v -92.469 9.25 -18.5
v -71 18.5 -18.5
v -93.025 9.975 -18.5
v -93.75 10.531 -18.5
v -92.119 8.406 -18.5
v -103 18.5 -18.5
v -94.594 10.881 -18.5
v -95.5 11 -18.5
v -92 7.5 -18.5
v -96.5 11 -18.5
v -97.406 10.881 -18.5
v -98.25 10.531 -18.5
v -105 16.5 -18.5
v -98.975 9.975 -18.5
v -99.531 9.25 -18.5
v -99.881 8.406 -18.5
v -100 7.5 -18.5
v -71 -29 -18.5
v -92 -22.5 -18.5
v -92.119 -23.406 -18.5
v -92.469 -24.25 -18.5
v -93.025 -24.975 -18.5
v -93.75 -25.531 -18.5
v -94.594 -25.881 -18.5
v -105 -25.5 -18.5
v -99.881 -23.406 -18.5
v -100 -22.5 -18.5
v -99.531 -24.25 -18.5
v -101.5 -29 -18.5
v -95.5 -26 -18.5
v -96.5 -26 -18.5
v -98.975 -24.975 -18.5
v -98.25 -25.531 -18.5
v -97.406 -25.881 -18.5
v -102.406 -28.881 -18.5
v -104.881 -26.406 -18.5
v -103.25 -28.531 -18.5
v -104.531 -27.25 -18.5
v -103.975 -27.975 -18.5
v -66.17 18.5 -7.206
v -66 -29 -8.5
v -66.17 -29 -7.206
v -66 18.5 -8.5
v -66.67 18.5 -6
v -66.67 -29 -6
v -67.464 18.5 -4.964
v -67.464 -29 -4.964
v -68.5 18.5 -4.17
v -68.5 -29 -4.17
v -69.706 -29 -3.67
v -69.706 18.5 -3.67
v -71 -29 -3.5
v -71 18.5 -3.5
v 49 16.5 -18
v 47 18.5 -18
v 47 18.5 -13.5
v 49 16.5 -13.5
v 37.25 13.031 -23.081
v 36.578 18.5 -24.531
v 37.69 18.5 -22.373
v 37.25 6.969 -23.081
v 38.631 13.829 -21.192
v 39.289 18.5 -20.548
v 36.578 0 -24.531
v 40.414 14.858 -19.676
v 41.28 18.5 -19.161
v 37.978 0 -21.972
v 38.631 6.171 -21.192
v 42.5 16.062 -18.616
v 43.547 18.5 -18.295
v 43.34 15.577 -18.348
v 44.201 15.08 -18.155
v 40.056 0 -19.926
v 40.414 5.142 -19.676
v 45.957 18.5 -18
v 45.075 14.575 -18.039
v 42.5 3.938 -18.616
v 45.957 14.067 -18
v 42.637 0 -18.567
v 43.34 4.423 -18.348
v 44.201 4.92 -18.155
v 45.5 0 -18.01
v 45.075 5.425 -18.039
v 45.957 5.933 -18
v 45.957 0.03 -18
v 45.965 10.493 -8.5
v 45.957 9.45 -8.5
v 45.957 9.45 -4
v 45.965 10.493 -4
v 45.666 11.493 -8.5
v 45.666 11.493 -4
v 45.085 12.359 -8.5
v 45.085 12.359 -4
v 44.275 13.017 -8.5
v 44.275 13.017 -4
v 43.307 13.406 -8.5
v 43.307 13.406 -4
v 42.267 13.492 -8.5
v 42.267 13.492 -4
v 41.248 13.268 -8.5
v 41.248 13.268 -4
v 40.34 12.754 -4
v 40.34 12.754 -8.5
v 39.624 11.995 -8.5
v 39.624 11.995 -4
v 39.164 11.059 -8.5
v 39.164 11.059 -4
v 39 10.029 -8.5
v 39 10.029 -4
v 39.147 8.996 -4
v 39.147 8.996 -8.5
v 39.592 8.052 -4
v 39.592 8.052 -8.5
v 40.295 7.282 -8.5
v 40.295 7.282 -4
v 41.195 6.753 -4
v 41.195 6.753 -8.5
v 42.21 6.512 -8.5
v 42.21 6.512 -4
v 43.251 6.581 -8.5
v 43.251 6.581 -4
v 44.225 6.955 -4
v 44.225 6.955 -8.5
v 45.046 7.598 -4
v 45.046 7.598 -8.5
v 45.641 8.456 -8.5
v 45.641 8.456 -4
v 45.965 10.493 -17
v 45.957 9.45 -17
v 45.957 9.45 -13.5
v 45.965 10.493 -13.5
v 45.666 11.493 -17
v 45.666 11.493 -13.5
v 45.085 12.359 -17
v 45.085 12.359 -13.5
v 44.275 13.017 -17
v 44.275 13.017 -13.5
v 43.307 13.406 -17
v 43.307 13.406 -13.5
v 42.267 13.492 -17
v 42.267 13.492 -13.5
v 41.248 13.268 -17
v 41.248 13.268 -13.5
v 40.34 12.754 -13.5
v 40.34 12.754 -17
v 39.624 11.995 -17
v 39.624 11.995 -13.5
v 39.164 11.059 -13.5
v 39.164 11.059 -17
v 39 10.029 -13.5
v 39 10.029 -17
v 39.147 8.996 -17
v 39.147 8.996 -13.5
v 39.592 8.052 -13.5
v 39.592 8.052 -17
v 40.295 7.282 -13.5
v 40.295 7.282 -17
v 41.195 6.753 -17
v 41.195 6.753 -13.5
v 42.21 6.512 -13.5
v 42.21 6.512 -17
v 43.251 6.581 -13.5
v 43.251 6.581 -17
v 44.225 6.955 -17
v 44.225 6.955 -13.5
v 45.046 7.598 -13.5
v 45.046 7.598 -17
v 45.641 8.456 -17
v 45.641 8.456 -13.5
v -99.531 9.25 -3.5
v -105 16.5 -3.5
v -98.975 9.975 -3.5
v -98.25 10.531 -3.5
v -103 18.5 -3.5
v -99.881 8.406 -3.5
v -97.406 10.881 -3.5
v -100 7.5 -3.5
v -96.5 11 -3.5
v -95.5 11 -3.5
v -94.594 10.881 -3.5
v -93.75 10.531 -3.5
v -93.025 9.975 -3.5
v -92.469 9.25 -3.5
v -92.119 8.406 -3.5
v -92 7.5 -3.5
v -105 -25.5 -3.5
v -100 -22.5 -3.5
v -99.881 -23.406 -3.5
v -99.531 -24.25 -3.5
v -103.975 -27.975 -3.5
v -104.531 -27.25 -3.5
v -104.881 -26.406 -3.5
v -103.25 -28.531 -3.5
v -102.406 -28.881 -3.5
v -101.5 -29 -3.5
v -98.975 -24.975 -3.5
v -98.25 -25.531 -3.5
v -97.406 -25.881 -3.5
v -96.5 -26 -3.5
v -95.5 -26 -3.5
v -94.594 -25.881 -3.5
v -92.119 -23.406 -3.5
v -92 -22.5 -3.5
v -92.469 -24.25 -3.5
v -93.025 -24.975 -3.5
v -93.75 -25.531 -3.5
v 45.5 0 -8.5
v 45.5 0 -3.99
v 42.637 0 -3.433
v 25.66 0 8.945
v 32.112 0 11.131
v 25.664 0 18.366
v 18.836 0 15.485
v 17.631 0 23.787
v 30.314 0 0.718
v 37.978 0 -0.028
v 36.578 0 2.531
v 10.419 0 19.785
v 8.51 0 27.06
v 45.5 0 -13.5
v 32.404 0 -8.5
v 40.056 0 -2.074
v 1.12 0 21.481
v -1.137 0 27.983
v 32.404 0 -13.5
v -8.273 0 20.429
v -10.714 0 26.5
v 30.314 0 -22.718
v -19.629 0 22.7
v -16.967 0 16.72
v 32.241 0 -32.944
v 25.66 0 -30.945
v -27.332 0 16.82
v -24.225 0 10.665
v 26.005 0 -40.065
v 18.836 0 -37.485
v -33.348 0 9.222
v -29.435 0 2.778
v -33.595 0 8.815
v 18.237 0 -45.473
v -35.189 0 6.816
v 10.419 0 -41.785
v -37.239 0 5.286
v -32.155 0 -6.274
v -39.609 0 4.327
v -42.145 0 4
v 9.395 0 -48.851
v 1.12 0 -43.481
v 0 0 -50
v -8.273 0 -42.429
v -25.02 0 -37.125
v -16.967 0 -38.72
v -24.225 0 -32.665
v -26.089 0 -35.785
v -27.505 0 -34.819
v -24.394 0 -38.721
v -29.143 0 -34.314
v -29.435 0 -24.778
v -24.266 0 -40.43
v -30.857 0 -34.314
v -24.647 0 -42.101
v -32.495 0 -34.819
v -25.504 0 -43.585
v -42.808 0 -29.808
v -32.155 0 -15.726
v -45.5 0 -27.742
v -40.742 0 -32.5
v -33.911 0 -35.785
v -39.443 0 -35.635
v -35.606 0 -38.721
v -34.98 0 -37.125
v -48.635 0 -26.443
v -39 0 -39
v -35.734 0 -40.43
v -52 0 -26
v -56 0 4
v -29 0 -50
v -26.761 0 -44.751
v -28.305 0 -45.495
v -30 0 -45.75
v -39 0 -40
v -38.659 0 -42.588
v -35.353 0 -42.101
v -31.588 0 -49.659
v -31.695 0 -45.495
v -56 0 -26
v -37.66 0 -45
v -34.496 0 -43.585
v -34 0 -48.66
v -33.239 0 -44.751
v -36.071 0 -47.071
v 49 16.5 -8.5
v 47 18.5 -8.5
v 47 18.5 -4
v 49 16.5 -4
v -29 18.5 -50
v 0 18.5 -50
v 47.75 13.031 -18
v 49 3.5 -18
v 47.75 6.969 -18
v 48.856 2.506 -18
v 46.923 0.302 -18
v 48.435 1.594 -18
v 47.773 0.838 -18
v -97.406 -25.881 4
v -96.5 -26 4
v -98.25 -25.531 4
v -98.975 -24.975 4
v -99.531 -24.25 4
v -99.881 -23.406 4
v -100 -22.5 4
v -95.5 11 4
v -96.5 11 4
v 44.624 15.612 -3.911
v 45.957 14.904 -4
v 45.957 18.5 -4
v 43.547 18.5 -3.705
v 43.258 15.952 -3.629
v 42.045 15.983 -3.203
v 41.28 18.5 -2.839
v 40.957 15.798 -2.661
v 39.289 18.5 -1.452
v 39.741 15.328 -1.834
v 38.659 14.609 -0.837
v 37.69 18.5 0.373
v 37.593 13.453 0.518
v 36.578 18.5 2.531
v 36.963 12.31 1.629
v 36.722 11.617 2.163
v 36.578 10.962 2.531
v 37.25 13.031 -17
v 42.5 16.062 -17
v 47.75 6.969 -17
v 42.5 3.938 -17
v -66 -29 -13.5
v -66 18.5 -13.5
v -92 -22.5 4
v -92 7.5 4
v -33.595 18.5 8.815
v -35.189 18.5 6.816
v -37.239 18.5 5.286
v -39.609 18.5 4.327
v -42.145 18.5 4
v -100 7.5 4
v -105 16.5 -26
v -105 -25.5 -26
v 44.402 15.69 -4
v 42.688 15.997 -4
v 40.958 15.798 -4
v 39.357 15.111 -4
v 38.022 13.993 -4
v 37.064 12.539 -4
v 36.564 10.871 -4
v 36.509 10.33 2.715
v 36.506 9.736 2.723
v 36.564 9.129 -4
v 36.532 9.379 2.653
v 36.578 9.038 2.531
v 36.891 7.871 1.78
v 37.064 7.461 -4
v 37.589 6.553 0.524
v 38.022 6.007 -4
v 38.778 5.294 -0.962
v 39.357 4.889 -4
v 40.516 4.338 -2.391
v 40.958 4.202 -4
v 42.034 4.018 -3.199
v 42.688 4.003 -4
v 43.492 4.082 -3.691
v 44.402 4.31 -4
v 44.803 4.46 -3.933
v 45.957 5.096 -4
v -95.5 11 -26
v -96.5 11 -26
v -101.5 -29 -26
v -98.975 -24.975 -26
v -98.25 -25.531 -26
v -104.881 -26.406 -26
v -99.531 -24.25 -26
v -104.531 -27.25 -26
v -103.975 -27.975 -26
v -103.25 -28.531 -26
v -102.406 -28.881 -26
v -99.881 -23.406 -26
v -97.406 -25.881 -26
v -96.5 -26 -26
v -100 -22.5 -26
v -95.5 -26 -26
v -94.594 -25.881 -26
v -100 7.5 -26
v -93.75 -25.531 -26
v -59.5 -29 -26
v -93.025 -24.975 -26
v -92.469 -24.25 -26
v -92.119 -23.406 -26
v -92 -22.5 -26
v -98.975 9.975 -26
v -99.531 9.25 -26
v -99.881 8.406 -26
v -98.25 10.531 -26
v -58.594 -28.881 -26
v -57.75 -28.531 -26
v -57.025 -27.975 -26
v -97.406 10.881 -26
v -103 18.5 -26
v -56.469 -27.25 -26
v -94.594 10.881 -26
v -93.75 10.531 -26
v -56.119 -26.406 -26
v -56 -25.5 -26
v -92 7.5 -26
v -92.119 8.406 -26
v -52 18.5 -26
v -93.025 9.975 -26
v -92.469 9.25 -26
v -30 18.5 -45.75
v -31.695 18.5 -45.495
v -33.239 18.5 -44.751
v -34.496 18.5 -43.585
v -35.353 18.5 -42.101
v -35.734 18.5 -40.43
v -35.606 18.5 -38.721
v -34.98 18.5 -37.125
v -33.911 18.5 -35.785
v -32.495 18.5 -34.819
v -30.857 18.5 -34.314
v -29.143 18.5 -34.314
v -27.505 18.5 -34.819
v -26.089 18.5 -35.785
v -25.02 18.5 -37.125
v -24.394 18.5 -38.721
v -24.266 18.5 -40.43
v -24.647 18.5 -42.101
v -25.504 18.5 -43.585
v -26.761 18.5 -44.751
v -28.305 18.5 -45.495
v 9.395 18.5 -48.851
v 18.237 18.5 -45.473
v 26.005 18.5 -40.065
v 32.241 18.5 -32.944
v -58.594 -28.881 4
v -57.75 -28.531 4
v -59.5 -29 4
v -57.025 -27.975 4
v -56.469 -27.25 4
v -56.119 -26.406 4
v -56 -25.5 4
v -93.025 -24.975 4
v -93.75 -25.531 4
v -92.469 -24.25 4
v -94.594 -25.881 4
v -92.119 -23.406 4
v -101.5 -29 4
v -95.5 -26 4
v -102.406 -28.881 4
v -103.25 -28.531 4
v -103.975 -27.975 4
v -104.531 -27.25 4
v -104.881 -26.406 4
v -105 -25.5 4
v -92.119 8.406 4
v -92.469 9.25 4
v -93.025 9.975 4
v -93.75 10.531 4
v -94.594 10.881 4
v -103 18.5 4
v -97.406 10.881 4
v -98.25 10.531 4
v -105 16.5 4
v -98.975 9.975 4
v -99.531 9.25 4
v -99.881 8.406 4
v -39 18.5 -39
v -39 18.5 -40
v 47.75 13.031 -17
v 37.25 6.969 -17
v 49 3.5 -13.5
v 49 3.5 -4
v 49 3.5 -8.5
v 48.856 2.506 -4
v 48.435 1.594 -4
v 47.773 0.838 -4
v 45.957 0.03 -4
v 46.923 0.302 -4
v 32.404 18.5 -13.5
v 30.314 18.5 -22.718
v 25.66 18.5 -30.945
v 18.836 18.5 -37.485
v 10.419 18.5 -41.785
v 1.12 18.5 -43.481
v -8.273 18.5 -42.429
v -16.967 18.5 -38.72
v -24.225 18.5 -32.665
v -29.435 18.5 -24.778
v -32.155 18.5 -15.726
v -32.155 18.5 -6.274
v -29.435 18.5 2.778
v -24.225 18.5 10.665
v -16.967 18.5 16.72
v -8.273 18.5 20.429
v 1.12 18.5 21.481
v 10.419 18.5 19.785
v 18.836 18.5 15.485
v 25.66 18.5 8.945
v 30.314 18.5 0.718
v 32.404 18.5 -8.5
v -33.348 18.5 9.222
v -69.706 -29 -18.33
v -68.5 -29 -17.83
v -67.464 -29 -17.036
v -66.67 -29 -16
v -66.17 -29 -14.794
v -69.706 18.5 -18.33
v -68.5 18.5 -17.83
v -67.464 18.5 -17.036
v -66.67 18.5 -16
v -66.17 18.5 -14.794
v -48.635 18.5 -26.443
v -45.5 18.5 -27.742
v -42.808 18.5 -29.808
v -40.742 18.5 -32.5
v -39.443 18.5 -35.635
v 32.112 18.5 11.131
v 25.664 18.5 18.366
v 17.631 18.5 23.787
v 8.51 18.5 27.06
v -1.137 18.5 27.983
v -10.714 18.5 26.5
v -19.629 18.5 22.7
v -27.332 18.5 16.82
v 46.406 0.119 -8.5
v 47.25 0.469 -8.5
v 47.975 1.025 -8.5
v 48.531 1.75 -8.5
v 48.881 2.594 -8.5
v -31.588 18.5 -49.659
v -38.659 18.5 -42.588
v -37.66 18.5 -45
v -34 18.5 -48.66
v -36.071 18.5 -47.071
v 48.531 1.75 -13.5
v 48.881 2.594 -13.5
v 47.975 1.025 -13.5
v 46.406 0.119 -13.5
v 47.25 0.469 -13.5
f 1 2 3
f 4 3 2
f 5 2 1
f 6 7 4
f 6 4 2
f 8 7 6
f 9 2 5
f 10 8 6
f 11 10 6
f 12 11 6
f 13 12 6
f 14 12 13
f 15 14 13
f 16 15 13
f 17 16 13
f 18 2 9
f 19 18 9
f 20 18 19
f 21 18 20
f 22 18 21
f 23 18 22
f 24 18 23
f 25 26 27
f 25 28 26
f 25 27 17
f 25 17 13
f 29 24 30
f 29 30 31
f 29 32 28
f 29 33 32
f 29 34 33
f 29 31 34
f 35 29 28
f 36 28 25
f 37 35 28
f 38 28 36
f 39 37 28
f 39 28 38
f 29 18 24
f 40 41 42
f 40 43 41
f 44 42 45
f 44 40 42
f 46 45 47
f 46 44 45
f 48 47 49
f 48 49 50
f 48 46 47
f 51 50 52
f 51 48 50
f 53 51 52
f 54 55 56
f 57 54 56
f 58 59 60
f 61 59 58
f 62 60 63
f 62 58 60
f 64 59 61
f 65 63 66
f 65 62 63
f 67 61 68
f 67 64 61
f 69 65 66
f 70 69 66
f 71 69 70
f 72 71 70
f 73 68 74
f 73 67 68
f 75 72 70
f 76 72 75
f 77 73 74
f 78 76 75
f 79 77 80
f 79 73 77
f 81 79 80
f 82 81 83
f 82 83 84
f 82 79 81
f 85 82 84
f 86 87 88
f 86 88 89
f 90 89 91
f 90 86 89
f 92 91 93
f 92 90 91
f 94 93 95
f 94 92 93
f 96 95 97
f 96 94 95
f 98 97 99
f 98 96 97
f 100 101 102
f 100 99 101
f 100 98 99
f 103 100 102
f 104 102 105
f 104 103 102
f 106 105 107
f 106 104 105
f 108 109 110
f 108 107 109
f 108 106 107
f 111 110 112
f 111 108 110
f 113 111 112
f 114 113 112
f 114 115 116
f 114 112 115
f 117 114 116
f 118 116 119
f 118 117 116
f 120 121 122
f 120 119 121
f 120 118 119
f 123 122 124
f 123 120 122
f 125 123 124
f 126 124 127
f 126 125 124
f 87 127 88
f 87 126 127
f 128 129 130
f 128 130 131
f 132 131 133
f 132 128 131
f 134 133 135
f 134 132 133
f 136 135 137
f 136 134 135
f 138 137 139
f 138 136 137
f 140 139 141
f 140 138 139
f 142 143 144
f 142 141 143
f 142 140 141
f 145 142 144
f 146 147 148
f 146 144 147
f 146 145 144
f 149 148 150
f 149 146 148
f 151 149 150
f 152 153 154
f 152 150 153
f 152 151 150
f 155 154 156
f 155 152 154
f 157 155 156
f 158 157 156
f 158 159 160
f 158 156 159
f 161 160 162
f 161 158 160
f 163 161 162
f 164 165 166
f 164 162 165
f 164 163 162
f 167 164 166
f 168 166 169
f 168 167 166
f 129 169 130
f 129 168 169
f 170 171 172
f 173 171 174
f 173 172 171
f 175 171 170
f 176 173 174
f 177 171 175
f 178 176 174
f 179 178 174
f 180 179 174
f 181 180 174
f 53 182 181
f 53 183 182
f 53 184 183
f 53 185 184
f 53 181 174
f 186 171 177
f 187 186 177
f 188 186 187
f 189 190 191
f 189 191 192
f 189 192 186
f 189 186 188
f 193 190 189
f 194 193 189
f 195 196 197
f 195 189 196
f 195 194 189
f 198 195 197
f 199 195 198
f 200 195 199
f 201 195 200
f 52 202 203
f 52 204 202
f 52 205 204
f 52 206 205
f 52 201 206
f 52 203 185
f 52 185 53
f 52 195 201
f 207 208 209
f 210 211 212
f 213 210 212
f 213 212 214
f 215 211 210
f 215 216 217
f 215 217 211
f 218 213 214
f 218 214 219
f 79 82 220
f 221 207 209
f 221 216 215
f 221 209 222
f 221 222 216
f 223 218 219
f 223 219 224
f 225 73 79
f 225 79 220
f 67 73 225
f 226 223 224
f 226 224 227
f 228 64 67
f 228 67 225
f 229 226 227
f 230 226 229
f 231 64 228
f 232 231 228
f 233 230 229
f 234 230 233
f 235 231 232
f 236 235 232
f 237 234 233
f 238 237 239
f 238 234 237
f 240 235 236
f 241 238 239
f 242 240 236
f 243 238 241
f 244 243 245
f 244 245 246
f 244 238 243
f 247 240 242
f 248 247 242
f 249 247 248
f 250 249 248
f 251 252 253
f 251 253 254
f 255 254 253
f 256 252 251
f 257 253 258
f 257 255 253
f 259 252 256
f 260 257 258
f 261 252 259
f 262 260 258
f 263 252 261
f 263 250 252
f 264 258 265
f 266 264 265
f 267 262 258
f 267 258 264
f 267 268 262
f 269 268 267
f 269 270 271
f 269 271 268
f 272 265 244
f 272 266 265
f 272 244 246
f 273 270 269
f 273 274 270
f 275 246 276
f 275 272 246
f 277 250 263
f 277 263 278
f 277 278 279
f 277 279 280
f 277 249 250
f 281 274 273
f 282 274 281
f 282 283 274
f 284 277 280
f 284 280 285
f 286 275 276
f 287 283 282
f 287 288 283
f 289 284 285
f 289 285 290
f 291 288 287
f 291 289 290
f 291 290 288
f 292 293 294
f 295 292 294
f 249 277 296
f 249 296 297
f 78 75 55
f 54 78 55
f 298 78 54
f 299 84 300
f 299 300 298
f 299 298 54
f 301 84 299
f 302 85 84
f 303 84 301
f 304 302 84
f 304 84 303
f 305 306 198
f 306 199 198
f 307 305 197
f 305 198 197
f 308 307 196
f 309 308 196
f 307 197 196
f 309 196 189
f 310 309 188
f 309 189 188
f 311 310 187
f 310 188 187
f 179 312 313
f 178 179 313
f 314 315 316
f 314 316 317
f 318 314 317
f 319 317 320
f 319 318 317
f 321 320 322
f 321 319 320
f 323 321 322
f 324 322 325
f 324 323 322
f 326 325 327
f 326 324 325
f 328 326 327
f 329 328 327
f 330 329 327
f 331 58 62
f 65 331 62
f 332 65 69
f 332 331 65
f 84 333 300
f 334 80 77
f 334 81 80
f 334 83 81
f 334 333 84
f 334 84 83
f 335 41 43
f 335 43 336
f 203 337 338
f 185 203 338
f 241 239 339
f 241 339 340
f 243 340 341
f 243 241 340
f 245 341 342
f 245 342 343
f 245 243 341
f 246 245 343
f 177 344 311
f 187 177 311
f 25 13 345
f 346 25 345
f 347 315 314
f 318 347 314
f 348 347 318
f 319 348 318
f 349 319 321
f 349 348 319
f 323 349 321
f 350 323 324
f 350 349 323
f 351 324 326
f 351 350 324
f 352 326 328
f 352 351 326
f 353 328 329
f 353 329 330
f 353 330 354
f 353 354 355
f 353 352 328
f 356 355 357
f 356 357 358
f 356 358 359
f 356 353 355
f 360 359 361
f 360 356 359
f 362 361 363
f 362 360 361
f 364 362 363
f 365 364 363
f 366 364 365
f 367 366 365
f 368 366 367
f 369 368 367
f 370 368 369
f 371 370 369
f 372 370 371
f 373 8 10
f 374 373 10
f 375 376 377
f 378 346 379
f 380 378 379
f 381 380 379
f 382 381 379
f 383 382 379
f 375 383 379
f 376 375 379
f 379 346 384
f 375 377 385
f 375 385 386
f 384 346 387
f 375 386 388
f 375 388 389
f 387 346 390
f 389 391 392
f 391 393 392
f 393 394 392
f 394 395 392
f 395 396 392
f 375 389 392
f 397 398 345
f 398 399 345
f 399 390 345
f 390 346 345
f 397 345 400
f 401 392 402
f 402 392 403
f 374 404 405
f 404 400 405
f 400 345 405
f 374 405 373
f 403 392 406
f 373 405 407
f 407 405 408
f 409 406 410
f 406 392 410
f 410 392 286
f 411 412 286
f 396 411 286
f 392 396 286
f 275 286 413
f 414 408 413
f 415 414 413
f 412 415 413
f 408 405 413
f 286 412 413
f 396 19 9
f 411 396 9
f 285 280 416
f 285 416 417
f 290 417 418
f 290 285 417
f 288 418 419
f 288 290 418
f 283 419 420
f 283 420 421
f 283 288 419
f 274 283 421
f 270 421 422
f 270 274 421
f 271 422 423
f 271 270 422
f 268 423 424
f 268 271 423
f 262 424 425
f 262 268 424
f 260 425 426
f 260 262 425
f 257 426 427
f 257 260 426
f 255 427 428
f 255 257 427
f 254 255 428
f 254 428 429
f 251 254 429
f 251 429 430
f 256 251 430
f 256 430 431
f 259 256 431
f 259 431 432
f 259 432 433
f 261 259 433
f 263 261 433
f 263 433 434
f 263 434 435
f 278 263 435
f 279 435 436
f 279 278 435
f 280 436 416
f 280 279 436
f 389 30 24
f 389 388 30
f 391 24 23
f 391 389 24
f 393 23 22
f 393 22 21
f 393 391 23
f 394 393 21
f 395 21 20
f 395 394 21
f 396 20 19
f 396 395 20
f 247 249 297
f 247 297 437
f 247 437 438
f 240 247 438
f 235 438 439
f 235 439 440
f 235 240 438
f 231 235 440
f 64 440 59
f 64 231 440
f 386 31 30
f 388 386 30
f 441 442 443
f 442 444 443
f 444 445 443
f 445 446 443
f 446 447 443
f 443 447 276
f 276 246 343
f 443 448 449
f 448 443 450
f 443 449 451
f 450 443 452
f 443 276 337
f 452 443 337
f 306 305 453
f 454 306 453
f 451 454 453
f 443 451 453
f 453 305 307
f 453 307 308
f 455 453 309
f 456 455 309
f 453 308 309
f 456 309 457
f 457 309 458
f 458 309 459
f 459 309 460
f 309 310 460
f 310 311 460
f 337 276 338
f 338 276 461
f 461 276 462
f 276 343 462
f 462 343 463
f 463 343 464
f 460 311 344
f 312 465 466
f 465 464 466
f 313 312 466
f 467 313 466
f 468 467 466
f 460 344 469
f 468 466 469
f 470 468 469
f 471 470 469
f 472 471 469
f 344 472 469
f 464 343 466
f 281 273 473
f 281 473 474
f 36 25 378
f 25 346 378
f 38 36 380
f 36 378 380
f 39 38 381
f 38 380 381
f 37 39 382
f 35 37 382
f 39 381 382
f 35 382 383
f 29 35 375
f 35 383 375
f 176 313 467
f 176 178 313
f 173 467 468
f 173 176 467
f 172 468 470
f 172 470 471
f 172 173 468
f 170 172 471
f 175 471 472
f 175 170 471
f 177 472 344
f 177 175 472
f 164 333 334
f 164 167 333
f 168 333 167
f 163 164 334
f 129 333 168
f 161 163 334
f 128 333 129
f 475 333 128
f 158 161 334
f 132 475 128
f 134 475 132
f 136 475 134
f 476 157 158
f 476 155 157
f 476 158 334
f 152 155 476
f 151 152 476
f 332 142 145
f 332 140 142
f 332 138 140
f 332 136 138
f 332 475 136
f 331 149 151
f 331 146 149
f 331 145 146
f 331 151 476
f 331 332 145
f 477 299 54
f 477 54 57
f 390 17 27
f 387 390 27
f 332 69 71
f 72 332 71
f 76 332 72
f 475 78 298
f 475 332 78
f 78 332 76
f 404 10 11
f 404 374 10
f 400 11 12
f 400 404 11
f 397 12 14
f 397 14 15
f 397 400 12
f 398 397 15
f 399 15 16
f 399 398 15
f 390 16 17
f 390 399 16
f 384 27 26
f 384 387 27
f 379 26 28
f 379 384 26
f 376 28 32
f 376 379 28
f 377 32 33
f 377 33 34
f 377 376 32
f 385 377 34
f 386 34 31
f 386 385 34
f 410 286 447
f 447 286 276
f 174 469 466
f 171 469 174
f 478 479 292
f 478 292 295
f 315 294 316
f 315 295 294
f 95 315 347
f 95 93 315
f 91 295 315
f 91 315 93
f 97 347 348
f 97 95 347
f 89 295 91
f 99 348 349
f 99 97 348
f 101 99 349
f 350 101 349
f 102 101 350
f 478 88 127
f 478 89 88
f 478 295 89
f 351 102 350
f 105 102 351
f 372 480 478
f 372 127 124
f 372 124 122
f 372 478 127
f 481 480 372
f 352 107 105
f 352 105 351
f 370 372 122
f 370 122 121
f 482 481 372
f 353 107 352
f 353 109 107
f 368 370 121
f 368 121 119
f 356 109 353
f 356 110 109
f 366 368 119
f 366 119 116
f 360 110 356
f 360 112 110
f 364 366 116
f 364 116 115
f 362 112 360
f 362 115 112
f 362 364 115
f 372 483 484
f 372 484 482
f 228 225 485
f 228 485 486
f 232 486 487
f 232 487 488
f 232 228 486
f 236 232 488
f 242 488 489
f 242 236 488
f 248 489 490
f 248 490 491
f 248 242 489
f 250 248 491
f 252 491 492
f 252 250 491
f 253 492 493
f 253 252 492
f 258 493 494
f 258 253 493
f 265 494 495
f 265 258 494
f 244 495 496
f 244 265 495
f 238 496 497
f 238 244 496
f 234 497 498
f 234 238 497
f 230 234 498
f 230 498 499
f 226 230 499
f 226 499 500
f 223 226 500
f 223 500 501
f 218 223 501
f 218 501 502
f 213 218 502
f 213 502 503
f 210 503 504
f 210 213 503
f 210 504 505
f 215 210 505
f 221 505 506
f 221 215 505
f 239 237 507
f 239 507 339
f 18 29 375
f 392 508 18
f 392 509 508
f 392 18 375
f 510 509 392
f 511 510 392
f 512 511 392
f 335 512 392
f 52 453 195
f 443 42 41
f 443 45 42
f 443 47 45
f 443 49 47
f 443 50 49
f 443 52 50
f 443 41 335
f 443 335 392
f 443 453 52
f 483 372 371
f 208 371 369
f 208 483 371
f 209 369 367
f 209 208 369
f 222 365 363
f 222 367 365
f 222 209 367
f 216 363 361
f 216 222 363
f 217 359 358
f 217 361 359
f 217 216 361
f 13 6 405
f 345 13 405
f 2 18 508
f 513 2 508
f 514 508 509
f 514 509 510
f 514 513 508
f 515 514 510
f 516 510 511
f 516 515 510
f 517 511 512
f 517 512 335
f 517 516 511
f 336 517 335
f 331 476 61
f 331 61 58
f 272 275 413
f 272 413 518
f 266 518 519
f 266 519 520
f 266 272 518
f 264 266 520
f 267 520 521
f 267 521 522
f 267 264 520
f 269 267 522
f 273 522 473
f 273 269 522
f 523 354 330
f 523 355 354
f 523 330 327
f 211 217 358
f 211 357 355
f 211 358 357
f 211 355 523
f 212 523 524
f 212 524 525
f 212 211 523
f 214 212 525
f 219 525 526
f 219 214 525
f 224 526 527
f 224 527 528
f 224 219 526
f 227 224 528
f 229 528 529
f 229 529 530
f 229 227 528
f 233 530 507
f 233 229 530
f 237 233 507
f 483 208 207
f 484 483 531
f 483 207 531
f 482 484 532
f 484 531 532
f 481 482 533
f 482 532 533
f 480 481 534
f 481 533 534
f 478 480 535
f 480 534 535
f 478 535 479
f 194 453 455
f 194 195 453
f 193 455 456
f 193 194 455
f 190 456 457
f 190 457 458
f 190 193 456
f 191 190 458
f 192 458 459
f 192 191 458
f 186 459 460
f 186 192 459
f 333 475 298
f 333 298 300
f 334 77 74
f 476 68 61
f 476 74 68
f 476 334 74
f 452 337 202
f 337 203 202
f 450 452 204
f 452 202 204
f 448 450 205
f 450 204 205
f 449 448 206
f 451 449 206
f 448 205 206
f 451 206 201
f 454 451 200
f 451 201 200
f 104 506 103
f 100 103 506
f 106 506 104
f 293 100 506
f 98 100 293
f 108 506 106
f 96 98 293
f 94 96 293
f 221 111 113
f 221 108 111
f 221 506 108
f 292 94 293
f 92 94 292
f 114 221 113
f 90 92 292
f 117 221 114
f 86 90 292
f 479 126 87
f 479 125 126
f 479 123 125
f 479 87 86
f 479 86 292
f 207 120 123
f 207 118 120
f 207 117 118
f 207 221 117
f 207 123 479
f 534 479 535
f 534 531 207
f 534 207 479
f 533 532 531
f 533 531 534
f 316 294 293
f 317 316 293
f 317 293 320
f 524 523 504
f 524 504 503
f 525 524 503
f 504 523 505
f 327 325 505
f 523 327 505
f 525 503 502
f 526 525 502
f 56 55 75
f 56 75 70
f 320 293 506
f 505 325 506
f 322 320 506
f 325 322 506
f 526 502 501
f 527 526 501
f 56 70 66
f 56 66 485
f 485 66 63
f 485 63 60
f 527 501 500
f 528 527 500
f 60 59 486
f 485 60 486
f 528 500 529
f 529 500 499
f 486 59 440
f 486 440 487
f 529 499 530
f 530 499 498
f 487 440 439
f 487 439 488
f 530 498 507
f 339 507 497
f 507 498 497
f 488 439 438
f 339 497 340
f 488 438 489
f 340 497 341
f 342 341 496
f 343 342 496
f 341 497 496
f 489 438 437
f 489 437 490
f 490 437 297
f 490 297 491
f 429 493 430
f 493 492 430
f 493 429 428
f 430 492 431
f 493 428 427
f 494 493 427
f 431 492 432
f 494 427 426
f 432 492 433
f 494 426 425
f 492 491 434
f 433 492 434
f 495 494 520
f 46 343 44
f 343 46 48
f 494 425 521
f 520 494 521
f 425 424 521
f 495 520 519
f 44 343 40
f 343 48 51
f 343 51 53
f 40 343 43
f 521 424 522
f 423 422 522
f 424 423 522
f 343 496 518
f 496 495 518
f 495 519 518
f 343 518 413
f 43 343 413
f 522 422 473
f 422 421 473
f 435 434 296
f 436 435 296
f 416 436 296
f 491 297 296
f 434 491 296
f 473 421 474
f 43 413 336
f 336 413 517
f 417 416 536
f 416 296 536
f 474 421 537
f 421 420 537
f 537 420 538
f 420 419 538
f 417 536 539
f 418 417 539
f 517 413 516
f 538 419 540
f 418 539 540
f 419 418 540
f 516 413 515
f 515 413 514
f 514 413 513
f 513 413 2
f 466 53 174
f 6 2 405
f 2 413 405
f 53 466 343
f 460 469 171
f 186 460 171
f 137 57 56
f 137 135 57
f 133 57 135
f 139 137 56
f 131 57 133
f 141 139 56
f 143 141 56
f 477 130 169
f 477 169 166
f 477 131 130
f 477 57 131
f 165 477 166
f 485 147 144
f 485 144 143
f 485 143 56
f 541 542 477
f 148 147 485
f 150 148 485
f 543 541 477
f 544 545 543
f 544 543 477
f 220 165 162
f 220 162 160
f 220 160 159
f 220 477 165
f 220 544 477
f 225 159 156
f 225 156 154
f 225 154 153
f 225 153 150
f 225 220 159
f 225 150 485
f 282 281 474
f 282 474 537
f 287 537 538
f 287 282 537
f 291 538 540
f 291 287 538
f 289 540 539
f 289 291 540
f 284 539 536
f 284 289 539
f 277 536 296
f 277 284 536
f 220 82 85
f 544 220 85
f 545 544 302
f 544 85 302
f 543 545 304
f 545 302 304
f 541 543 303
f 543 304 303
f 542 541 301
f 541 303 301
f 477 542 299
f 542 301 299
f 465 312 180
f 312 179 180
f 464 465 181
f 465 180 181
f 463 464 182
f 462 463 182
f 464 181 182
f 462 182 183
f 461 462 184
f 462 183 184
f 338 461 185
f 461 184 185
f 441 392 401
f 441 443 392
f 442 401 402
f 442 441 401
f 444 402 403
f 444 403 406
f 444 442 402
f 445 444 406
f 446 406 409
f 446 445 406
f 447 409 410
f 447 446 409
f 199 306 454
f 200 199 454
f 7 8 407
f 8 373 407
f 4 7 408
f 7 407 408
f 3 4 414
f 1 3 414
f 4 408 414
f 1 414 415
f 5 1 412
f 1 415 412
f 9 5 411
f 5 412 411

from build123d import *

# Parameters (mm, degrees)
SKETCH1_R               = 5.75
BOSS_EXTRUDE1_DEPTH     = 18.5
BOSS_EXTRUDE2_DEPTH     = 29
CUT_EXTRUDE1_DEPTH      = 126.623445264
CUT_EXTRUDE2_DEPTH      = 122.581248554
FILLET1_R               = 3.5
CHAMFER1_SIZE           = 2
CUT_EXTRUDE3_DEPTH      = 119.245507314
CUT_EXTRUDE3_DEPTH_BACK = 119.245507314
SKETCH7_R               = 3.5
CUT_EXTRUDE4_DEPTH      = 10
CUT_EXTRUDE4_DEPTH_BACK = 1
SKETCH9_R               = 6
CUT_EXTRUDE5_DEPTH      = 10
FILLET3_R               = 3.5
CHAMFER2_SIZE           = 2
FILLET4_R               = 5


with BuildPart() as part:
    # Sketch1 → Boss-Extrude1 (new body)
    with BuildSketch(Plane(origin=(0, 0, 0), x_dir=(1, 0, 0), z_dir=(0, 1, 0))):
        with BuildLine():
            Line((-29, 50), (0, 50))
            ThreePointArc((0, 50), (22.285714286, 43.005420459), (36.577623382, 24.530612245))
            ThreePointArc((36.577623382, 24.530612245), (40.242215458, 19.793481934), (45.956501172, 18))
            Line((45.956501172, 18), (49, 18))
            Line((49, 18), (49, 13.5))
            Line((49, 13.5), (32.403703492, 13.5))
            ThreePointArc((32.403703492, 13.5), (-32.5, 11), (32.403703492, 8.5))
            Line((32.403703492, 8.5), (49, 8.5))
            Line((49, 8.5), (49, 4))
            Line((49, 4), (45.956501172, 4))
            ThreePointArc((45.956501172, 4), (40.242215458, 2.206518066), (36.577623382, -2.530612245))
            ThreePointArc((36.577623382, -2.530612245), (3.715197259, -27.822639134), (-33.347589544, -9.222222222))
            Line((-33.347589544, -9.222222222), (-33.594644376, -8.814814815))
            ThreePointArc((-33.594644376, -8.814814815), (-37.238774547, -5.286451588), (-42.145308361, -4))
            Line((-42.145308361, -4), (-46.173585522, -4))
            Line((-46.173585522, -4), (-74, -4))
            Line((-74, -4), (-105, -4))
            Line((-105, -4), (-105, 26))
            Line((-105, 26), (-74, 26))
            Line((-74, 26), (-52, 26))
            ThreePointArc((-52, 26), (-42.807611845, 29.807611845), (-39, 39))
            Line((-39, 39), (-39, 40))
            ThreePointArc((-39, 40), (-36.071067812, 47.071067812), (-29, 50))
        make_face()
        with Locations(Location((-30, 40, 0), (0, 0, 90))):
            Circle(SKETCH1_R, mode=Mode.SUBTRACT)
    extrude(amount=BOSS_EXTRUDE1_DEPTH)

    # Sketch3 → Boss-Extrude2 (add)
    with BuildSketch(Plane.XZ):
        Polygon((-105, -26), (-56, -26), (-56, -2.142135624), (-56, 4), (-105, 4), align=None)
    extrude(amount=BOSS_EXTRUDE2_DEPTH)

    # Sketch5 → Cut-Extrude1 (cut, through all)
    with BuildSketch(Plane(origin=(0, -29, 0), x_dir=(-1, 0, 0), z_dir=(0, -1, 0))):
        Polygon((66, 3.5), (66, 18.5), (105, 18.5), (105, 11), (105, 3.5), align=None)
    extrude(amount=-CUT_EXTRUDE1_DEPTH, mode=Mode.SUBTRACT)

    # Sketch6 → Cut-Extrude2 (cut, through all)
    with BuildSketch(Plane.XY.offset(4)):
        Polygon((-92, 11), (-100, 11), (-100, -26), (-92, -26), (-92, -5.5), align=None)
    extrude(amount=-CUT_EXTRUDE2_DEPTH, mode=Mode.SUBTRACT)

    # Fillet1
    fillet1_edges = [part.edges().sort_by_distance(p)[0] for p in [
        (-92, 11, -22.25),
        (-92, 11, 0.25),
        (-92, -26, -22.25),
        (-92, -26, 0.25),
        (-100, -26, -22.25),
        (-100, -26, 0.25),
        (-100, 11, -22.25),
        (-100, 11, 0.25),
        (-56, -29, -11),
        (-105, -29, 0.25),
        (-105, -29, -22.25),
    ]]
    fillet(fillet1_edges, radius=FILLET1_R)

    # Chamfer1
    chamfer1_edges = [part.edges().sort_by_distance(p)[0] for p in [
        (-105, 18.5, -22.25),
        (-105, 18.5, 0.25),
    ]]
    chamfer(chamfer1_edges, length=CHAMFER1_SIZE)

    # Sketch7 → Cut-Extrude3 (cut, two sides: drawn at the far end of the back side and taken through both)
    with BuildSketch(Plane.XY.offset(-4).offset(-CUT_EXTRUDE3_DEPTH_BACK)):
        with Locations(Location((42.5, 10, 0), (0, 0, 350.957402384))):
            Circle(SKETCH7_R)
    extrude(amount=CUT_EXTRUDE3_DEPTH + CUT_EXTRUDE3_DEPTH_BACK, mode=Mode.SUBTRACT)

    # Sketch8 → Cut-Extrude4 (cut, two sides: drawn at the far end of the back side and taken through both)
    with BuildSketch(Plane(origin=(0, 0, -18), x_dir=(-1, 0, 0), z_dir=(0, 0, -1)).offset(-CUT_EXTRUDE4_DEPTH_BACK)):
        Polygon((-42.5, 16.062177826), (-47.75, 13.031088913), (-47.75, 6.968911087), (-42.5, 3.937822174), (-37.25, 6.968911087), (-37.25, 13.031088913), align=None)
    extrude(amount=CUT_EXTRUDE4_DEPTH + CUT_EXTRUDE4_DEPTH_BACK, mode=Mode.SUBTRACT)

    # Sketch9 → Cut-Extrude5 (cut)
    with BuildSketch(Plane.XY.offset(-4)):
        with Locations((42.5, 10)):
            Circle(SKETCH9_R)
    extrude(amount=CUT_EXTRUDE5_DEPTH, mode=Mode.SUBTRACT)

    # Fillet3
    # the kernel refuses this fillet: 3.5 mm, written as the material it takes off along each edge
    with BuildSketch(Plane(origin=(49, 0, -26.75), x_dir=(0, 1, 0), z_dir=(0, 0, 1)), Plane(origin=(49, 0, -17.25), x_dir=(0, 1, 0), z_dir=(0, 0, 1))) as fillet3_piece_1:
        with BuildLine():
            CenterArc((FILLET3_R, FILLET3_R), FILLET3_R, 180, 90)
            Line((0, FILLET3_R), (0, 0))
            Line((0, 0), (FILLET3_R, 0))
        make_face()
    extrude(amount=22, mode=Mode.SUBTRACT)

    # Chamfer2
    chamfer2_edges = [part.edges().sort_by_distance(p)[0] for p in [
        (49, 18.5, -6.25),
        (49, 18.5, -15.75),
    ]]
    chamfer(chamfer2_edges, length=CHAMFER2_SIZE)

    # Fillet4
    fillet4_edges = [part.edges().sort_by_distance(p)[0] for p in [
        (-66, -5.25, -18.5),
        (-66, -5.25, -3.5),
    ]]
    fillet(fillet4_edges, radius=FILLET4_R)


solid = part.part
